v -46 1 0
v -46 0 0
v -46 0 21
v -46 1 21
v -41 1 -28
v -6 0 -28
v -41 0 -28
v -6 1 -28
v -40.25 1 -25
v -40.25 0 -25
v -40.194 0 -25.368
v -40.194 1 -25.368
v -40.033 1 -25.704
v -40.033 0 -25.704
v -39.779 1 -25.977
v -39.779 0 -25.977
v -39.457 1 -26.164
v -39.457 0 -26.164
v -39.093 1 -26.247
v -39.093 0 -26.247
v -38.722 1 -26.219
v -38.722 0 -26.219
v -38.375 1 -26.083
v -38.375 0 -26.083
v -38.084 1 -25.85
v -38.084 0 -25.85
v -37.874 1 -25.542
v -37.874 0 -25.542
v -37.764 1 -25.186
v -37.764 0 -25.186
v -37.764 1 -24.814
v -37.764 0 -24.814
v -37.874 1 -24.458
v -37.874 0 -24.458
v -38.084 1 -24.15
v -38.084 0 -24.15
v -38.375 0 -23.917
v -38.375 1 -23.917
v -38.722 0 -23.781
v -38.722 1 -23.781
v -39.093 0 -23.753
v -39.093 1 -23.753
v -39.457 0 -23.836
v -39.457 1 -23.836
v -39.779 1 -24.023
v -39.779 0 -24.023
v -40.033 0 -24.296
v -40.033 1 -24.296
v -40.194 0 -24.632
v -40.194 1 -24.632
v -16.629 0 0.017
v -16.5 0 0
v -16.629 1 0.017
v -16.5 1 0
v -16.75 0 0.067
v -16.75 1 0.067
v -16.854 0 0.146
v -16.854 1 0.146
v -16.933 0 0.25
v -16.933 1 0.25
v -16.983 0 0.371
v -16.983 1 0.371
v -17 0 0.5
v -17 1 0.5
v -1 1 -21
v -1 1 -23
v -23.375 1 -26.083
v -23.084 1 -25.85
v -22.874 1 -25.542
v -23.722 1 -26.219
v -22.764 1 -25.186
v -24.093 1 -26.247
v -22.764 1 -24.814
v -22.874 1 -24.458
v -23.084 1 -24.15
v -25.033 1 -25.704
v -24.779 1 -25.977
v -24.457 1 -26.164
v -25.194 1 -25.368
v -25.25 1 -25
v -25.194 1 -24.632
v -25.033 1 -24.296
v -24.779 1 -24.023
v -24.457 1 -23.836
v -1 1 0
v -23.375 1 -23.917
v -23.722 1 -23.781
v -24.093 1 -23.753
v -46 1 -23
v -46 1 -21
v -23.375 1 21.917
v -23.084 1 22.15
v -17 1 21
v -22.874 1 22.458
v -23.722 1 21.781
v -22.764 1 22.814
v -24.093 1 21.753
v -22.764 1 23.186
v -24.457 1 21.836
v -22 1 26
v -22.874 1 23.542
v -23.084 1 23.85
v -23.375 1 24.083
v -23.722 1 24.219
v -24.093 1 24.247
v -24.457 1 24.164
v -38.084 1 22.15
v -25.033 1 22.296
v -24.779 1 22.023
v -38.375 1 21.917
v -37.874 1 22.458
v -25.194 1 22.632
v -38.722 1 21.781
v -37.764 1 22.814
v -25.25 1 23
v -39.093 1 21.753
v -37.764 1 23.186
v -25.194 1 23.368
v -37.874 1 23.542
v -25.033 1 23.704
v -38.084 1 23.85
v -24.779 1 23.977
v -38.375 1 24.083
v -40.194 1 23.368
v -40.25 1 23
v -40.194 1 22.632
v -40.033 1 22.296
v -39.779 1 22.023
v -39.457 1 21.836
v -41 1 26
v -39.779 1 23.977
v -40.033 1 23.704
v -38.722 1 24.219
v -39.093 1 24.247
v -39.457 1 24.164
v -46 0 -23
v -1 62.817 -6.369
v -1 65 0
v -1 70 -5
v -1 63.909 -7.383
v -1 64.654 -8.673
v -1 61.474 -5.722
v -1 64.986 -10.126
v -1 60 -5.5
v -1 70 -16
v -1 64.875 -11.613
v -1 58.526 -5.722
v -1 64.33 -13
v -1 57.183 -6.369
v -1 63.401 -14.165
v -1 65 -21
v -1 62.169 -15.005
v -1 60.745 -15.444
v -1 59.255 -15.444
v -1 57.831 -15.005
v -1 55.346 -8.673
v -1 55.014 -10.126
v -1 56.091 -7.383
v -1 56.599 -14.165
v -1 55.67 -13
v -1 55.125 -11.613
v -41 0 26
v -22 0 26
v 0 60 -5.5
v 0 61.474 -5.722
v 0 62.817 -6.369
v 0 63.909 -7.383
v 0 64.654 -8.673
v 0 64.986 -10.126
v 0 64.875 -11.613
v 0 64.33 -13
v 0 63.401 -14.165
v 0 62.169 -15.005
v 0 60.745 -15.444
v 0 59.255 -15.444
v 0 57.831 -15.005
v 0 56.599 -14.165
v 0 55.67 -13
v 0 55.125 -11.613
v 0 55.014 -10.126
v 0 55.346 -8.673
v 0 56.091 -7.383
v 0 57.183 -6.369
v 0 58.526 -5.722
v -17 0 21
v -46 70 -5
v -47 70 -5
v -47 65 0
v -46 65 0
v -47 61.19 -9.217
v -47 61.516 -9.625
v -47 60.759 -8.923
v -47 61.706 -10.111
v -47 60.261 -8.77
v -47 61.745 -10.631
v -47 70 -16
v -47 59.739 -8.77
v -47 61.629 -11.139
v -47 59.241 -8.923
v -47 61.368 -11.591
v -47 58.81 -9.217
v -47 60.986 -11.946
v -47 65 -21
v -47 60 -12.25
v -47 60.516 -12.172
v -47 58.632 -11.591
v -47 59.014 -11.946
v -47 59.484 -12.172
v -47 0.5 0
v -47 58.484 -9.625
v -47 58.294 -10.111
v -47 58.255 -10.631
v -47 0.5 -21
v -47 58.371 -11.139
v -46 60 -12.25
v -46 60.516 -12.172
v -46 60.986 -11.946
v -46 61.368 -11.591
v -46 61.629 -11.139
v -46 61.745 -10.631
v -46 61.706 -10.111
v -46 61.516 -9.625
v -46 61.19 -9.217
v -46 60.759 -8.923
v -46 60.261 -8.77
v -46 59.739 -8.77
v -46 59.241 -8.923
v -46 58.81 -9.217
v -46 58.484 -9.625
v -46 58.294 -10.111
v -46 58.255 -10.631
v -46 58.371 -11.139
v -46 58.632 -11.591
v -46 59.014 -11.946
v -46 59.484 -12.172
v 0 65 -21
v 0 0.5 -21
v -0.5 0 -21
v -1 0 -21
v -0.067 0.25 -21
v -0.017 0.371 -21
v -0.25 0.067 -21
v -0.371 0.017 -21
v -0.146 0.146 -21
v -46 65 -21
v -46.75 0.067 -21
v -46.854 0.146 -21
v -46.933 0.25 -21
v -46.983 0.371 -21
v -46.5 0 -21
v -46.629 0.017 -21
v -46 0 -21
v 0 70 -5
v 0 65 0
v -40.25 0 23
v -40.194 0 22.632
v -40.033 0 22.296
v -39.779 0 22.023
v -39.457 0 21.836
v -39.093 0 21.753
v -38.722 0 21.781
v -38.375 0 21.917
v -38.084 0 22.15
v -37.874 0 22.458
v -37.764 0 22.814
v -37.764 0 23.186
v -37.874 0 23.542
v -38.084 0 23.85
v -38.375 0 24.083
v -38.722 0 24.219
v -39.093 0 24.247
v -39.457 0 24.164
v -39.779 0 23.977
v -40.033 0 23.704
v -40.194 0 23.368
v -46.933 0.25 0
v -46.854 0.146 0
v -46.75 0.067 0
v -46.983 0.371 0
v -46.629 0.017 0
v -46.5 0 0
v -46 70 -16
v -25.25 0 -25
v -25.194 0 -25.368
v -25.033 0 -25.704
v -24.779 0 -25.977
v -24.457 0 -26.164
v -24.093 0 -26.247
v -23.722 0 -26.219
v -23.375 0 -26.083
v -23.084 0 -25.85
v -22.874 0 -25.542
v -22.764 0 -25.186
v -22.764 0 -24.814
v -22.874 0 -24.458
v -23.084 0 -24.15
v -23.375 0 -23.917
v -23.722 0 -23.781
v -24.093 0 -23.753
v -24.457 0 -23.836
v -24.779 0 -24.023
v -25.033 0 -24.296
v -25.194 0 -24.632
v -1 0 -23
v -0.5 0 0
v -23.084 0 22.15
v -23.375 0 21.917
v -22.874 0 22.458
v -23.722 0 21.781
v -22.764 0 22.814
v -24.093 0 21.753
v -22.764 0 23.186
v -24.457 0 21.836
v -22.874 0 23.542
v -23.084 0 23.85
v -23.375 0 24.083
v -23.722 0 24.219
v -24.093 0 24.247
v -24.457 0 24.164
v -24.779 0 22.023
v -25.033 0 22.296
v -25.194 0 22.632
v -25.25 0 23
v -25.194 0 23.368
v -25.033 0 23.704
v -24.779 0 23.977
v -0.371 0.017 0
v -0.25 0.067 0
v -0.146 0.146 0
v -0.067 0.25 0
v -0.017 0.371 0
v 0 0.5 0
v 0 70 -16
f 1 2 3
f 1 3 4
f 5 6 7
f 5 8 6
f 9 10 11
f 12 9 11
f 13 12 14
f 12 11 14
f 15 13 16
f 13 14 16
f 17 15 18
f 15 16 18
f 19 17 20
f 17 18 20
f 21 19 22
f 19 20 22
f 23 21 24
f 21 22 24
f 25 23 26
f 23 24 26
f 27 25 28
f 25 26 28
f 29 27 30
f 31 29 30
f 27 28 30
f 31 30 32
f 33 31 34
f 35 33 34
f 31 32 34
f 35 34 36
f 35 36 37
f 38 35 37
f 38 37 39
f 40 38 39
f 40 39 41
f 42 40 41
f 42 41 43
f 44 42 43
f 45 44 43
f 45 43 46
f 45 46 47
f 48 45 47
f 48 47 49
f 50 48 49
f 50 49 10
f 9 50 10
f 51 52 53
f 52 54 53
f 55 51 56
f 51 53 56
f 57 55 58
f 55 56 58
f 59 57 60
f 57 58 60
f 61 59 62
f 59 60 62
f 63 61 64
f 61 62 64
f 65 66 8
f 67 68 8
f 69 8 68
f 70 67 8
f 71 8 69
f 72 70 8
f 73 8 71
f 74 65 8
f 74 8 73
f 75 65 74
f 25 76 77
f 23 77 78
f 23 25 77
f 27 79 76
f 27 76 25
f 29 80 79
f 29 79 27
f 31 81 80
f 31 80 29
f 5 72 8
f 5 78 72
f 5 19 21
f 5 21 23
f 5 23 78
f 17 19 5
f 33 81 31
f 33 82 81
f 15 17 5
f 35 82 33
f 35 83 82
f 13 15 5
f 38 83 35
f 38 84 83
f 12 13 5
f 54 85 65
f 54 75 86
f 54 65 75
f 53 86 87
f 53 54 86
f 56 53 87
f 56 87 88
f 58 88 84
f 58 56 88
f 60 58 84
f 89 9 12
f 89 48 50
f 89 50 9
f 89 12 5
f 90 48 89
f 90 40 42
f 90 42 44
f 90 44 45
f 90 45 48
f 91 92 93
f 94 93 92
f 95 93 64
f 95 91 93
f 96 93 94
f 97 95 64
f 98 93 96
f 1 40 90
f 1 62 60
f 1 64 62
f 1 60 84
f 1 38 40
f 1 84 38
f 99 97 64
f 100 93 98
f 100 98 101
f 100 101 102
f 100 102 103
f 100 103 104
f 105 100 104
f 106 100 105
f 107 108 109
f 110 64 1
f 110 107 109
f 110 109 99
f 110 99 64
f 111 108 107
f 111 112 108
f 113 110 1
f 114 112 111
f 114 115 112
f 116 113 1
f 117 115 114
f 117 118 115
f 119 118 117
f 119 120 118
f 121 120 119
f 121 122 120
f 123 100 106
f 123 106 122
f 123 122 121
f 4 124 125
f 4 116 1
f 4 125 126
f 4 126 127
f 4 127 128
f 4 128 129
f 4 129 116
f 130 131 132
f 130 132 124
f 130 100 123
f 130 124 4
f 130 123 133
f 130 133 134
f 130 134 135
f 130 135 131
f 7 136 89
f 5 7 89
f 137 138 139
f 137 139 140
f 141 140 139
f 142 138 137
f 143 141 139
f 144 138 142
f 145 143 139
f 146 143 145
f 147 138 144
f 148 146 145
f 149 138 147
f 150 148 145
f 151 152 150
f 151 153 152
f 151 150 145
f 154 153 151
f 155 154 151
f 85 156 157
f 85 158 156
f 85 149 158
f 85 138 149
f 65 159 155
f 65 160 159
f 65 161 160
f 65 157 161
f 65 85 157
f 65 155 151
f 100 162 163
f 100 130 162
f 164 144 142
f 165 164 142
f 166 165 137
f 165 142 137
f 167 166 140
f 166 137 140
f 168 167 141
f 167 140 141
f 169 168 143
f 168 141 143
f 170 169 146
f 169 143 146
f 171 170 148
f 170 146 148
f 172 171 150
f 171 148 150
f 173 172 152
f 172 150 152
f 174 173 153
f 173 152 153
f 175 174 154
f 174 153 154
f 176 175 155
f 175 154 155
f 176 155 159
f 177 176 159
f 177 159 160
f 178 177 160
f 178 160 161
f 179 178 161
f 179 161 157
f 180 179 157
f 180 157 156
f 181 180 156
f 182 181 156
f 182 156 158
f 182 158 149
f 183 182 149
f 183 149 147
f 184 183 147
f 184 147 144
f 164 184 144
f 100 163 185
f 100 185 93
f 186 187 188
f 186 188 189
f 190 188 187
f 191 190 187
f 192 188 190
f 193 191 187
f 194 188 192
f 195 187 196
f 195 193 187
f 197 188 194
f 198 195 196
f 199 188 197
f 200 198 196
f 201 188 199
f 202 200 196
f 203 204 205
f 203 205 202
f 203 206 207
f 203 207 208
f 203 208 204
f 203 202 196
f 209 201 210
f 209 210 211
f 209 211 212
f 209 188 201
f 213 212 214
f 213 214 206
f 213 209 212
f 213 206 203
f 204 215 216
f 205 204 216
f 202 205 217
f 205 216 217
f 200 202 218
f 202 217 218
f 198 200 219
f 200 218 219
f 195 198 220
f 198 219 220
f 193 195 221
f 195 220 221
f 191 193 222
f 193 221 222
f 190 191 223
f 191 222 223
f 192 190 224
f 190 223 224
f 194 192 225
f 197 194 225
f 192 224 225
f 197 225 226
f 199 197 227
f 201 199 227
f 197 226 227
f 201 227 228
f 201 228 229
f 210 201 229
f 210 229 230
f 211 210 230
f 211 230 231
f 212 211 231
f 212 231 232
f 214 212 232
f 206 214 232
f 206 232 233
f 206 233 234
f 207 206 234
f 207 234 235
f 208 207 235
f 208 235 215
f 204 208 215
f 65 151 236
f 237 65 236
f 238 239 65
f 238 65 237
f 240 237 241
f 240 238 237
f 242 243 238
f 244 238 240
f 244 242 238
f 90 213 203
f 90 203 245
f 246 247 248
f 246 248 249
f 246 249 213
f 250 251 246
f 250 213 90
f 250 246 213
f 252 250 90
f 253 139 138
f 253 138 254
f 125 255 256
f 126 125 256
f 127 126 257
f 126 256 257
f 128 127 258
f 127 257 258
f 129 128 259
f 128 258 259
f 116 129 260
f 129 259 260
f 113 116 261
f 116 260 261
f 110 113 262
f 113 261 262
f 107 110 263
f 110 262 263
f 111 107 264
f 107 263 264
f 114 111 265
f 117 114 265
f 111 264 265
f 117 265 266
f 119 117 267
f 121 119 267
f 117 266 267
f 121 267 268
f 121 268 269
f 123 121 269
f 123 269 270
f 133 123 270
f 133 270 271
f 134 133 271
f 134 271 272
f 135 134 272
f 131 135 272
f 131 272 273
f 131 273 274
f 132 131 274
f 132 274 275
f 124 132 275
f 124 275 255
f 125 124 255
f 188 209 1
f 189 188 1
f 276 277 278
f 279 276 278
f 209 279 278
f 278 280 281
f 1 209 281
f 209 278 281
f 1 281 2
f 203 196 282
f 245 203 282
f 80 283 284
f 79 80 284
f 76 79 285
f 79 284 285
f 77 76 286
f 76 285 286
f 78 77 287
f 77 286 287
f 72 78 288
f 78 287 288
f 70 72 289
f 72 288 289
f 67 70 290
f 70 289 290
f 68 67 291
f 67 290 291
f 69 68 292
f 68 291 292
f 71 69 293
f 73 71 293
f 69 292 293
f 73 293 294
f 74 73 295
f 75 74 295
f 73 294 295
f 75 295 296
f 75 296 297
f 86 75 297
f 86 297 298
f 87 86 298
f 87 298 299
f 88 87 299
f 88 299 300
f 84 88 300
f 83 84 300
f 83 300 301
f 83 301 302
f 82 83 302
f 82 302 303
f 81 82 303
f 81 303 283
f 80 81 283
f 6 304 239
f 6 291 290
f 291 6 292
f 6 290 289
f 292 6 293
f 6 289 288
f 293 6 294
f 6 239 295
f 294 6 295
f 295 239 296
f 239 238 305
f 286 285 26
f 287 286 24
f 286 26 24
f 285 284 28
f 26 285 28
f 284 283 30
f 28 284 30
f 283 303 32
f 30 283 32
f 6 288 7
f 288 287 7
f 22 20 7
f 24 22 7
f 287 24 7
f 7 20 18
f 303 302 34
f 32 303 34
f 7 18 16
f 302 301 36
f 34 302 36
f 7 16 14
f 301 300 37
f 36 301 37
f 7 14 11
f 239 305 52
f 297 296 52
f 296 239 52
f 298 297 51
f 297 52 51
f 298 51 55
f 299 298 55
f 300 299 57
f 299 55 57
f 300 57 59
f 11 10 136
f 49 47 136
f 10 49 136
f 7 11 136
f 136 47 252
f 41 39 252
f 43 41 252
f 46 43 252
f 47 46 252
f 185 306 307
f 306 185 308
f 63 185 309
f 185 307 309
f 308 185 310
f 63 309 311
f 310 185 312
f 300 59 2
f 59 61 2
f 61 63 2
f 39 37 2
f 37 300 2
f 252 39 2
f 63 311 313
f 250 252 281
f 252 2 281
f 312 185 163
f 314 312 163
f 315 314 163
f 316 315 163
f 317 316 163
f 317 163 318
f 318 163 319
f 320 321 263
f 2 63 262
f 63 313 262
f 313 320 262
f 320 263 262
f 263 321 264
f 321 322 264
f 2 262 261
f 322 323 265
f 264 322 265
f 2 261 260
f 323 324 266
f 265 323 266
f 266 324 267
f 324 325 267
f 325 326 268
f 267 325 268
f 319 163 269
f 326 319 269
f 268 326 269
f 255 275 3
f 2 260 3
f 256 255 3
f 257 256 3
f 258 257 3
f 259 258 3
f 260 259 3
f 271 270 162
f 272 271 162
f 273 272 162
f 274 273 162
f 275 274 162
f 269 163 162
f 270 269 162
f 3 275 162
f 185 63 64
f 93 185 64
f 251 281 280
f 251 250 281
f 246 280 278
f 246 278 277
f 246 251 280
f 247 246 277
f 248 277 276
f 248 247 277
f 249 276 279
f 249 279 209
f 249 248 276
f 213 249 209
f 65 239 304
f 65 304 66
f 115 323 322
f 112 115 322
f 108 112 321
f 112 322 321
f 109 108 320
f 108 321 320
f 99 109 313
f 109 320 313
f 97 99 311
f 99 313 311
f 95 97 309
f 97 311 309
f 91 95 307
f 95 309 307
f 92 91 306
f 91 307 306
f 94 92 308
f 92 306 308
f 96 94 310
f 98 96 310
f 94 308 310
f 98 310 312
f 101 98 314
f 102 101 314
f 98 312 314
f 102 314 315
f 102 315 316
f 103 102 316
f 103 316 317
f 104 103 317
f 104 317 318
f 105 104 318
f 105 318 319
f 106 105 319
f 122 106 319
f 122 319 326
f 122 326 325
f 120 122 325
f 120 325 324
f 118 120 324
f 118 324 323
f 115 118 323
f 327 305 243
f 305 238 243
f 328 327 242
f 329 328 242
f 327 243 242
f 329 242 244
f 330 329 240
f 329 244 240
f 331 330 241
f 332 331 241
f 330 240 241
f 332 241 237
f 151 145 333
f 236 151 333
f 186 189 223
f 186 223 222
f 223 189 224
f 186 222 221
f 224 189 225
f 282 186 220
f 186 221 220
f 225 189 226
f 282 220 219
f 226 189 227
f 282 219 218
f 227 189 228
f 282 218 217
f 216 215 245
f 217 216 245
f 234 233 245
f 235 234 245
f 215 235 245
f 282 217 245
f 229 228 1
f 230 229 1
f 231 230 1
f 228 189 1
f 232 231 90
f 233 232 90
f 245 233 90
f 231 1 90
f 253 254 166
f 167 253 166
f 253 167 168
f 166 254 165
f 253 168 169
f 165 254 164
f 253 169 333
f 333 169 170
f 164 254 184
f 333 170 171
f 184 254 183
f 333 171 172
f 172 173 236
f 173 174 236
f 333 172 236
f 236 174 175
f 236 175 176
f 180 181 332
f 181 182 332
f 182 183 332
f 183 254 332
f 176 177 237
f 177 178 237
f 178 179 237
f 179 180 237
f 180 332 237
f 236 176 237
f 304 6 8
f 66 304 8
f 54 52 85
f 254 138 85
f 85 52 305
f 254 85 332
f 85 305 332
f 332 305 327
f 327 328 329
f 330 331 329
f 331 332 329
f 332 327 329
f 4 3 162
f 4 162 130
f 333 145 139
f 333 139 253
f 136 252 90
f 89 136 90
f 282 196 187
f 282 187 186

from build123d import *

# Parameters (mm, degrees)
SKETCH_1_W                  = 47
SKETCH_1_H                  = 21
EXTRUDE_1_DEPTH             = 70
SHELL_1_T                   = -1
SKETCH_2_W                  = 29
SKETCH_2_H                  = 1
EXTRUDE_2_DEPTH             = 26
SKETCH_3_W                  = 45
SKETCH_3_H                  = 1
EXTRUDE_3_DEPTH             = 7
HOLE_WIZARD_10_0_10_1_D     = 10
HOLE_WIZARD_10_0_10_1_DEPTH = 1
HOLE_WIZARD_3_5_3_5_1_D     = 3.5
HOLE_WIZARD_M3_1_D          = 2.5
CHAMFER_1_SIZE              = 5
FILLET_1_R                  = 0.5


with BuildPart() as part:
    # 草图1 → 凸台-拉伸1 (new body)
    with BuildSketch(Plane(origin=(0, 0, 0), x_dir=(1, 0, 0), z_dir=(0, 1, 0))):
        with Locations((-23.5, 10.5)):
            Rectangle(SKETCH_1_W, SKETCH_1_H)
    extrude(amount=EXTRUDE_1_DEPTH)

    # 抽壳1
    shell_1_openings = [part.faces().sort_by_distance(p)[0] for p in [
        (-23.5, 70, -10.5),
        (-23.5, 35, 0),
        (-23.5, 35, -21),
    ]]
    offset(amount=SHELL_1_T, openings=shell_1_openings, kind=Kind.INTERSECTION)

    # 草图2 → 凸台-拉伸2 (add)
    with BuildSketch(Plane.XY):
        with Locations((-31.5, 0.5)):
            Rectangle(SKETCH_2_W, SKETCH_2_H)
    extrude(amount=EXTRUDE_2_DEPTH)

    # 草图3 → 凸台-拉伸3 (add)
    with BuildSketch(Plane(origin=(0, 0, -21), x_dir=(-1, 0, 0), z_dir=(0, 0, -1))):
        with Locations((23.5, 0.5)):
            Rectangle(SKETCH_3_W, SKETCH_3_H)
    extrude(amount=EXTRUDE_3_DEPTH)

    # Ø10.0 (10) 直径槽口1
    with Locations(Plane(origin=(0, 0, 0), x_dir=(0, 0, -1), z_dir=(1, 0, 0))):
        with Locations((10.5, 60)):
            Hole(HOLE_WIZARD_10_0_10_1_D / 2, depth=HOLE_WIZARD_10_0_10_1_DEPTH)

    # Ø3.5 (3.5) 直径槽口1 (through all)
    with Locations(Plane.ZY.offset(47)):
        with Locations((-10.5, 60)):
            Hole(HOLE_WIZARD_3_5_3_5_1_D / 2)

    # M3 螺纹孔1 (through all)
    with Locations(Plane(origin=(0, 1, 0), x_dir=(1, 0, 0), z_dir=(0, 1, 0))):
        with Locations((-39, -23), (-24, -23), (-24, 25), (-39, 25)):
            Hole(HOLE_WIZARD_M3_1_D / 2)

    # 倒角1
    chamfer_1_edges = [part.edges().sort_by_distance(p)[0] for p in [
        (-46.5, 70, 0),
        (-46.5, 70, -21),
        (-0.5, 70, 0),
        (-46, 0.5, 26),
        (-17, 0.5, 26),
        (-1, 0.5, -28),
        (-46, 0.5, -28),
        (-0.5, 70, -21),
    ]]
    chamfer(chamfer_1_edges, length=CHAMFER_1_SIZE)

    # 圆角1
    fillet_1_edges = [part.edges().sort_by_distance(p)[0] for p in [
        (-17, 0.5, 0),
        (-47, 0, -10.5),
        (0, 0, -10.5),
    ]]
    fillet(fillet_1_edges, radius=FILLET_1_R)


solid = part.part
